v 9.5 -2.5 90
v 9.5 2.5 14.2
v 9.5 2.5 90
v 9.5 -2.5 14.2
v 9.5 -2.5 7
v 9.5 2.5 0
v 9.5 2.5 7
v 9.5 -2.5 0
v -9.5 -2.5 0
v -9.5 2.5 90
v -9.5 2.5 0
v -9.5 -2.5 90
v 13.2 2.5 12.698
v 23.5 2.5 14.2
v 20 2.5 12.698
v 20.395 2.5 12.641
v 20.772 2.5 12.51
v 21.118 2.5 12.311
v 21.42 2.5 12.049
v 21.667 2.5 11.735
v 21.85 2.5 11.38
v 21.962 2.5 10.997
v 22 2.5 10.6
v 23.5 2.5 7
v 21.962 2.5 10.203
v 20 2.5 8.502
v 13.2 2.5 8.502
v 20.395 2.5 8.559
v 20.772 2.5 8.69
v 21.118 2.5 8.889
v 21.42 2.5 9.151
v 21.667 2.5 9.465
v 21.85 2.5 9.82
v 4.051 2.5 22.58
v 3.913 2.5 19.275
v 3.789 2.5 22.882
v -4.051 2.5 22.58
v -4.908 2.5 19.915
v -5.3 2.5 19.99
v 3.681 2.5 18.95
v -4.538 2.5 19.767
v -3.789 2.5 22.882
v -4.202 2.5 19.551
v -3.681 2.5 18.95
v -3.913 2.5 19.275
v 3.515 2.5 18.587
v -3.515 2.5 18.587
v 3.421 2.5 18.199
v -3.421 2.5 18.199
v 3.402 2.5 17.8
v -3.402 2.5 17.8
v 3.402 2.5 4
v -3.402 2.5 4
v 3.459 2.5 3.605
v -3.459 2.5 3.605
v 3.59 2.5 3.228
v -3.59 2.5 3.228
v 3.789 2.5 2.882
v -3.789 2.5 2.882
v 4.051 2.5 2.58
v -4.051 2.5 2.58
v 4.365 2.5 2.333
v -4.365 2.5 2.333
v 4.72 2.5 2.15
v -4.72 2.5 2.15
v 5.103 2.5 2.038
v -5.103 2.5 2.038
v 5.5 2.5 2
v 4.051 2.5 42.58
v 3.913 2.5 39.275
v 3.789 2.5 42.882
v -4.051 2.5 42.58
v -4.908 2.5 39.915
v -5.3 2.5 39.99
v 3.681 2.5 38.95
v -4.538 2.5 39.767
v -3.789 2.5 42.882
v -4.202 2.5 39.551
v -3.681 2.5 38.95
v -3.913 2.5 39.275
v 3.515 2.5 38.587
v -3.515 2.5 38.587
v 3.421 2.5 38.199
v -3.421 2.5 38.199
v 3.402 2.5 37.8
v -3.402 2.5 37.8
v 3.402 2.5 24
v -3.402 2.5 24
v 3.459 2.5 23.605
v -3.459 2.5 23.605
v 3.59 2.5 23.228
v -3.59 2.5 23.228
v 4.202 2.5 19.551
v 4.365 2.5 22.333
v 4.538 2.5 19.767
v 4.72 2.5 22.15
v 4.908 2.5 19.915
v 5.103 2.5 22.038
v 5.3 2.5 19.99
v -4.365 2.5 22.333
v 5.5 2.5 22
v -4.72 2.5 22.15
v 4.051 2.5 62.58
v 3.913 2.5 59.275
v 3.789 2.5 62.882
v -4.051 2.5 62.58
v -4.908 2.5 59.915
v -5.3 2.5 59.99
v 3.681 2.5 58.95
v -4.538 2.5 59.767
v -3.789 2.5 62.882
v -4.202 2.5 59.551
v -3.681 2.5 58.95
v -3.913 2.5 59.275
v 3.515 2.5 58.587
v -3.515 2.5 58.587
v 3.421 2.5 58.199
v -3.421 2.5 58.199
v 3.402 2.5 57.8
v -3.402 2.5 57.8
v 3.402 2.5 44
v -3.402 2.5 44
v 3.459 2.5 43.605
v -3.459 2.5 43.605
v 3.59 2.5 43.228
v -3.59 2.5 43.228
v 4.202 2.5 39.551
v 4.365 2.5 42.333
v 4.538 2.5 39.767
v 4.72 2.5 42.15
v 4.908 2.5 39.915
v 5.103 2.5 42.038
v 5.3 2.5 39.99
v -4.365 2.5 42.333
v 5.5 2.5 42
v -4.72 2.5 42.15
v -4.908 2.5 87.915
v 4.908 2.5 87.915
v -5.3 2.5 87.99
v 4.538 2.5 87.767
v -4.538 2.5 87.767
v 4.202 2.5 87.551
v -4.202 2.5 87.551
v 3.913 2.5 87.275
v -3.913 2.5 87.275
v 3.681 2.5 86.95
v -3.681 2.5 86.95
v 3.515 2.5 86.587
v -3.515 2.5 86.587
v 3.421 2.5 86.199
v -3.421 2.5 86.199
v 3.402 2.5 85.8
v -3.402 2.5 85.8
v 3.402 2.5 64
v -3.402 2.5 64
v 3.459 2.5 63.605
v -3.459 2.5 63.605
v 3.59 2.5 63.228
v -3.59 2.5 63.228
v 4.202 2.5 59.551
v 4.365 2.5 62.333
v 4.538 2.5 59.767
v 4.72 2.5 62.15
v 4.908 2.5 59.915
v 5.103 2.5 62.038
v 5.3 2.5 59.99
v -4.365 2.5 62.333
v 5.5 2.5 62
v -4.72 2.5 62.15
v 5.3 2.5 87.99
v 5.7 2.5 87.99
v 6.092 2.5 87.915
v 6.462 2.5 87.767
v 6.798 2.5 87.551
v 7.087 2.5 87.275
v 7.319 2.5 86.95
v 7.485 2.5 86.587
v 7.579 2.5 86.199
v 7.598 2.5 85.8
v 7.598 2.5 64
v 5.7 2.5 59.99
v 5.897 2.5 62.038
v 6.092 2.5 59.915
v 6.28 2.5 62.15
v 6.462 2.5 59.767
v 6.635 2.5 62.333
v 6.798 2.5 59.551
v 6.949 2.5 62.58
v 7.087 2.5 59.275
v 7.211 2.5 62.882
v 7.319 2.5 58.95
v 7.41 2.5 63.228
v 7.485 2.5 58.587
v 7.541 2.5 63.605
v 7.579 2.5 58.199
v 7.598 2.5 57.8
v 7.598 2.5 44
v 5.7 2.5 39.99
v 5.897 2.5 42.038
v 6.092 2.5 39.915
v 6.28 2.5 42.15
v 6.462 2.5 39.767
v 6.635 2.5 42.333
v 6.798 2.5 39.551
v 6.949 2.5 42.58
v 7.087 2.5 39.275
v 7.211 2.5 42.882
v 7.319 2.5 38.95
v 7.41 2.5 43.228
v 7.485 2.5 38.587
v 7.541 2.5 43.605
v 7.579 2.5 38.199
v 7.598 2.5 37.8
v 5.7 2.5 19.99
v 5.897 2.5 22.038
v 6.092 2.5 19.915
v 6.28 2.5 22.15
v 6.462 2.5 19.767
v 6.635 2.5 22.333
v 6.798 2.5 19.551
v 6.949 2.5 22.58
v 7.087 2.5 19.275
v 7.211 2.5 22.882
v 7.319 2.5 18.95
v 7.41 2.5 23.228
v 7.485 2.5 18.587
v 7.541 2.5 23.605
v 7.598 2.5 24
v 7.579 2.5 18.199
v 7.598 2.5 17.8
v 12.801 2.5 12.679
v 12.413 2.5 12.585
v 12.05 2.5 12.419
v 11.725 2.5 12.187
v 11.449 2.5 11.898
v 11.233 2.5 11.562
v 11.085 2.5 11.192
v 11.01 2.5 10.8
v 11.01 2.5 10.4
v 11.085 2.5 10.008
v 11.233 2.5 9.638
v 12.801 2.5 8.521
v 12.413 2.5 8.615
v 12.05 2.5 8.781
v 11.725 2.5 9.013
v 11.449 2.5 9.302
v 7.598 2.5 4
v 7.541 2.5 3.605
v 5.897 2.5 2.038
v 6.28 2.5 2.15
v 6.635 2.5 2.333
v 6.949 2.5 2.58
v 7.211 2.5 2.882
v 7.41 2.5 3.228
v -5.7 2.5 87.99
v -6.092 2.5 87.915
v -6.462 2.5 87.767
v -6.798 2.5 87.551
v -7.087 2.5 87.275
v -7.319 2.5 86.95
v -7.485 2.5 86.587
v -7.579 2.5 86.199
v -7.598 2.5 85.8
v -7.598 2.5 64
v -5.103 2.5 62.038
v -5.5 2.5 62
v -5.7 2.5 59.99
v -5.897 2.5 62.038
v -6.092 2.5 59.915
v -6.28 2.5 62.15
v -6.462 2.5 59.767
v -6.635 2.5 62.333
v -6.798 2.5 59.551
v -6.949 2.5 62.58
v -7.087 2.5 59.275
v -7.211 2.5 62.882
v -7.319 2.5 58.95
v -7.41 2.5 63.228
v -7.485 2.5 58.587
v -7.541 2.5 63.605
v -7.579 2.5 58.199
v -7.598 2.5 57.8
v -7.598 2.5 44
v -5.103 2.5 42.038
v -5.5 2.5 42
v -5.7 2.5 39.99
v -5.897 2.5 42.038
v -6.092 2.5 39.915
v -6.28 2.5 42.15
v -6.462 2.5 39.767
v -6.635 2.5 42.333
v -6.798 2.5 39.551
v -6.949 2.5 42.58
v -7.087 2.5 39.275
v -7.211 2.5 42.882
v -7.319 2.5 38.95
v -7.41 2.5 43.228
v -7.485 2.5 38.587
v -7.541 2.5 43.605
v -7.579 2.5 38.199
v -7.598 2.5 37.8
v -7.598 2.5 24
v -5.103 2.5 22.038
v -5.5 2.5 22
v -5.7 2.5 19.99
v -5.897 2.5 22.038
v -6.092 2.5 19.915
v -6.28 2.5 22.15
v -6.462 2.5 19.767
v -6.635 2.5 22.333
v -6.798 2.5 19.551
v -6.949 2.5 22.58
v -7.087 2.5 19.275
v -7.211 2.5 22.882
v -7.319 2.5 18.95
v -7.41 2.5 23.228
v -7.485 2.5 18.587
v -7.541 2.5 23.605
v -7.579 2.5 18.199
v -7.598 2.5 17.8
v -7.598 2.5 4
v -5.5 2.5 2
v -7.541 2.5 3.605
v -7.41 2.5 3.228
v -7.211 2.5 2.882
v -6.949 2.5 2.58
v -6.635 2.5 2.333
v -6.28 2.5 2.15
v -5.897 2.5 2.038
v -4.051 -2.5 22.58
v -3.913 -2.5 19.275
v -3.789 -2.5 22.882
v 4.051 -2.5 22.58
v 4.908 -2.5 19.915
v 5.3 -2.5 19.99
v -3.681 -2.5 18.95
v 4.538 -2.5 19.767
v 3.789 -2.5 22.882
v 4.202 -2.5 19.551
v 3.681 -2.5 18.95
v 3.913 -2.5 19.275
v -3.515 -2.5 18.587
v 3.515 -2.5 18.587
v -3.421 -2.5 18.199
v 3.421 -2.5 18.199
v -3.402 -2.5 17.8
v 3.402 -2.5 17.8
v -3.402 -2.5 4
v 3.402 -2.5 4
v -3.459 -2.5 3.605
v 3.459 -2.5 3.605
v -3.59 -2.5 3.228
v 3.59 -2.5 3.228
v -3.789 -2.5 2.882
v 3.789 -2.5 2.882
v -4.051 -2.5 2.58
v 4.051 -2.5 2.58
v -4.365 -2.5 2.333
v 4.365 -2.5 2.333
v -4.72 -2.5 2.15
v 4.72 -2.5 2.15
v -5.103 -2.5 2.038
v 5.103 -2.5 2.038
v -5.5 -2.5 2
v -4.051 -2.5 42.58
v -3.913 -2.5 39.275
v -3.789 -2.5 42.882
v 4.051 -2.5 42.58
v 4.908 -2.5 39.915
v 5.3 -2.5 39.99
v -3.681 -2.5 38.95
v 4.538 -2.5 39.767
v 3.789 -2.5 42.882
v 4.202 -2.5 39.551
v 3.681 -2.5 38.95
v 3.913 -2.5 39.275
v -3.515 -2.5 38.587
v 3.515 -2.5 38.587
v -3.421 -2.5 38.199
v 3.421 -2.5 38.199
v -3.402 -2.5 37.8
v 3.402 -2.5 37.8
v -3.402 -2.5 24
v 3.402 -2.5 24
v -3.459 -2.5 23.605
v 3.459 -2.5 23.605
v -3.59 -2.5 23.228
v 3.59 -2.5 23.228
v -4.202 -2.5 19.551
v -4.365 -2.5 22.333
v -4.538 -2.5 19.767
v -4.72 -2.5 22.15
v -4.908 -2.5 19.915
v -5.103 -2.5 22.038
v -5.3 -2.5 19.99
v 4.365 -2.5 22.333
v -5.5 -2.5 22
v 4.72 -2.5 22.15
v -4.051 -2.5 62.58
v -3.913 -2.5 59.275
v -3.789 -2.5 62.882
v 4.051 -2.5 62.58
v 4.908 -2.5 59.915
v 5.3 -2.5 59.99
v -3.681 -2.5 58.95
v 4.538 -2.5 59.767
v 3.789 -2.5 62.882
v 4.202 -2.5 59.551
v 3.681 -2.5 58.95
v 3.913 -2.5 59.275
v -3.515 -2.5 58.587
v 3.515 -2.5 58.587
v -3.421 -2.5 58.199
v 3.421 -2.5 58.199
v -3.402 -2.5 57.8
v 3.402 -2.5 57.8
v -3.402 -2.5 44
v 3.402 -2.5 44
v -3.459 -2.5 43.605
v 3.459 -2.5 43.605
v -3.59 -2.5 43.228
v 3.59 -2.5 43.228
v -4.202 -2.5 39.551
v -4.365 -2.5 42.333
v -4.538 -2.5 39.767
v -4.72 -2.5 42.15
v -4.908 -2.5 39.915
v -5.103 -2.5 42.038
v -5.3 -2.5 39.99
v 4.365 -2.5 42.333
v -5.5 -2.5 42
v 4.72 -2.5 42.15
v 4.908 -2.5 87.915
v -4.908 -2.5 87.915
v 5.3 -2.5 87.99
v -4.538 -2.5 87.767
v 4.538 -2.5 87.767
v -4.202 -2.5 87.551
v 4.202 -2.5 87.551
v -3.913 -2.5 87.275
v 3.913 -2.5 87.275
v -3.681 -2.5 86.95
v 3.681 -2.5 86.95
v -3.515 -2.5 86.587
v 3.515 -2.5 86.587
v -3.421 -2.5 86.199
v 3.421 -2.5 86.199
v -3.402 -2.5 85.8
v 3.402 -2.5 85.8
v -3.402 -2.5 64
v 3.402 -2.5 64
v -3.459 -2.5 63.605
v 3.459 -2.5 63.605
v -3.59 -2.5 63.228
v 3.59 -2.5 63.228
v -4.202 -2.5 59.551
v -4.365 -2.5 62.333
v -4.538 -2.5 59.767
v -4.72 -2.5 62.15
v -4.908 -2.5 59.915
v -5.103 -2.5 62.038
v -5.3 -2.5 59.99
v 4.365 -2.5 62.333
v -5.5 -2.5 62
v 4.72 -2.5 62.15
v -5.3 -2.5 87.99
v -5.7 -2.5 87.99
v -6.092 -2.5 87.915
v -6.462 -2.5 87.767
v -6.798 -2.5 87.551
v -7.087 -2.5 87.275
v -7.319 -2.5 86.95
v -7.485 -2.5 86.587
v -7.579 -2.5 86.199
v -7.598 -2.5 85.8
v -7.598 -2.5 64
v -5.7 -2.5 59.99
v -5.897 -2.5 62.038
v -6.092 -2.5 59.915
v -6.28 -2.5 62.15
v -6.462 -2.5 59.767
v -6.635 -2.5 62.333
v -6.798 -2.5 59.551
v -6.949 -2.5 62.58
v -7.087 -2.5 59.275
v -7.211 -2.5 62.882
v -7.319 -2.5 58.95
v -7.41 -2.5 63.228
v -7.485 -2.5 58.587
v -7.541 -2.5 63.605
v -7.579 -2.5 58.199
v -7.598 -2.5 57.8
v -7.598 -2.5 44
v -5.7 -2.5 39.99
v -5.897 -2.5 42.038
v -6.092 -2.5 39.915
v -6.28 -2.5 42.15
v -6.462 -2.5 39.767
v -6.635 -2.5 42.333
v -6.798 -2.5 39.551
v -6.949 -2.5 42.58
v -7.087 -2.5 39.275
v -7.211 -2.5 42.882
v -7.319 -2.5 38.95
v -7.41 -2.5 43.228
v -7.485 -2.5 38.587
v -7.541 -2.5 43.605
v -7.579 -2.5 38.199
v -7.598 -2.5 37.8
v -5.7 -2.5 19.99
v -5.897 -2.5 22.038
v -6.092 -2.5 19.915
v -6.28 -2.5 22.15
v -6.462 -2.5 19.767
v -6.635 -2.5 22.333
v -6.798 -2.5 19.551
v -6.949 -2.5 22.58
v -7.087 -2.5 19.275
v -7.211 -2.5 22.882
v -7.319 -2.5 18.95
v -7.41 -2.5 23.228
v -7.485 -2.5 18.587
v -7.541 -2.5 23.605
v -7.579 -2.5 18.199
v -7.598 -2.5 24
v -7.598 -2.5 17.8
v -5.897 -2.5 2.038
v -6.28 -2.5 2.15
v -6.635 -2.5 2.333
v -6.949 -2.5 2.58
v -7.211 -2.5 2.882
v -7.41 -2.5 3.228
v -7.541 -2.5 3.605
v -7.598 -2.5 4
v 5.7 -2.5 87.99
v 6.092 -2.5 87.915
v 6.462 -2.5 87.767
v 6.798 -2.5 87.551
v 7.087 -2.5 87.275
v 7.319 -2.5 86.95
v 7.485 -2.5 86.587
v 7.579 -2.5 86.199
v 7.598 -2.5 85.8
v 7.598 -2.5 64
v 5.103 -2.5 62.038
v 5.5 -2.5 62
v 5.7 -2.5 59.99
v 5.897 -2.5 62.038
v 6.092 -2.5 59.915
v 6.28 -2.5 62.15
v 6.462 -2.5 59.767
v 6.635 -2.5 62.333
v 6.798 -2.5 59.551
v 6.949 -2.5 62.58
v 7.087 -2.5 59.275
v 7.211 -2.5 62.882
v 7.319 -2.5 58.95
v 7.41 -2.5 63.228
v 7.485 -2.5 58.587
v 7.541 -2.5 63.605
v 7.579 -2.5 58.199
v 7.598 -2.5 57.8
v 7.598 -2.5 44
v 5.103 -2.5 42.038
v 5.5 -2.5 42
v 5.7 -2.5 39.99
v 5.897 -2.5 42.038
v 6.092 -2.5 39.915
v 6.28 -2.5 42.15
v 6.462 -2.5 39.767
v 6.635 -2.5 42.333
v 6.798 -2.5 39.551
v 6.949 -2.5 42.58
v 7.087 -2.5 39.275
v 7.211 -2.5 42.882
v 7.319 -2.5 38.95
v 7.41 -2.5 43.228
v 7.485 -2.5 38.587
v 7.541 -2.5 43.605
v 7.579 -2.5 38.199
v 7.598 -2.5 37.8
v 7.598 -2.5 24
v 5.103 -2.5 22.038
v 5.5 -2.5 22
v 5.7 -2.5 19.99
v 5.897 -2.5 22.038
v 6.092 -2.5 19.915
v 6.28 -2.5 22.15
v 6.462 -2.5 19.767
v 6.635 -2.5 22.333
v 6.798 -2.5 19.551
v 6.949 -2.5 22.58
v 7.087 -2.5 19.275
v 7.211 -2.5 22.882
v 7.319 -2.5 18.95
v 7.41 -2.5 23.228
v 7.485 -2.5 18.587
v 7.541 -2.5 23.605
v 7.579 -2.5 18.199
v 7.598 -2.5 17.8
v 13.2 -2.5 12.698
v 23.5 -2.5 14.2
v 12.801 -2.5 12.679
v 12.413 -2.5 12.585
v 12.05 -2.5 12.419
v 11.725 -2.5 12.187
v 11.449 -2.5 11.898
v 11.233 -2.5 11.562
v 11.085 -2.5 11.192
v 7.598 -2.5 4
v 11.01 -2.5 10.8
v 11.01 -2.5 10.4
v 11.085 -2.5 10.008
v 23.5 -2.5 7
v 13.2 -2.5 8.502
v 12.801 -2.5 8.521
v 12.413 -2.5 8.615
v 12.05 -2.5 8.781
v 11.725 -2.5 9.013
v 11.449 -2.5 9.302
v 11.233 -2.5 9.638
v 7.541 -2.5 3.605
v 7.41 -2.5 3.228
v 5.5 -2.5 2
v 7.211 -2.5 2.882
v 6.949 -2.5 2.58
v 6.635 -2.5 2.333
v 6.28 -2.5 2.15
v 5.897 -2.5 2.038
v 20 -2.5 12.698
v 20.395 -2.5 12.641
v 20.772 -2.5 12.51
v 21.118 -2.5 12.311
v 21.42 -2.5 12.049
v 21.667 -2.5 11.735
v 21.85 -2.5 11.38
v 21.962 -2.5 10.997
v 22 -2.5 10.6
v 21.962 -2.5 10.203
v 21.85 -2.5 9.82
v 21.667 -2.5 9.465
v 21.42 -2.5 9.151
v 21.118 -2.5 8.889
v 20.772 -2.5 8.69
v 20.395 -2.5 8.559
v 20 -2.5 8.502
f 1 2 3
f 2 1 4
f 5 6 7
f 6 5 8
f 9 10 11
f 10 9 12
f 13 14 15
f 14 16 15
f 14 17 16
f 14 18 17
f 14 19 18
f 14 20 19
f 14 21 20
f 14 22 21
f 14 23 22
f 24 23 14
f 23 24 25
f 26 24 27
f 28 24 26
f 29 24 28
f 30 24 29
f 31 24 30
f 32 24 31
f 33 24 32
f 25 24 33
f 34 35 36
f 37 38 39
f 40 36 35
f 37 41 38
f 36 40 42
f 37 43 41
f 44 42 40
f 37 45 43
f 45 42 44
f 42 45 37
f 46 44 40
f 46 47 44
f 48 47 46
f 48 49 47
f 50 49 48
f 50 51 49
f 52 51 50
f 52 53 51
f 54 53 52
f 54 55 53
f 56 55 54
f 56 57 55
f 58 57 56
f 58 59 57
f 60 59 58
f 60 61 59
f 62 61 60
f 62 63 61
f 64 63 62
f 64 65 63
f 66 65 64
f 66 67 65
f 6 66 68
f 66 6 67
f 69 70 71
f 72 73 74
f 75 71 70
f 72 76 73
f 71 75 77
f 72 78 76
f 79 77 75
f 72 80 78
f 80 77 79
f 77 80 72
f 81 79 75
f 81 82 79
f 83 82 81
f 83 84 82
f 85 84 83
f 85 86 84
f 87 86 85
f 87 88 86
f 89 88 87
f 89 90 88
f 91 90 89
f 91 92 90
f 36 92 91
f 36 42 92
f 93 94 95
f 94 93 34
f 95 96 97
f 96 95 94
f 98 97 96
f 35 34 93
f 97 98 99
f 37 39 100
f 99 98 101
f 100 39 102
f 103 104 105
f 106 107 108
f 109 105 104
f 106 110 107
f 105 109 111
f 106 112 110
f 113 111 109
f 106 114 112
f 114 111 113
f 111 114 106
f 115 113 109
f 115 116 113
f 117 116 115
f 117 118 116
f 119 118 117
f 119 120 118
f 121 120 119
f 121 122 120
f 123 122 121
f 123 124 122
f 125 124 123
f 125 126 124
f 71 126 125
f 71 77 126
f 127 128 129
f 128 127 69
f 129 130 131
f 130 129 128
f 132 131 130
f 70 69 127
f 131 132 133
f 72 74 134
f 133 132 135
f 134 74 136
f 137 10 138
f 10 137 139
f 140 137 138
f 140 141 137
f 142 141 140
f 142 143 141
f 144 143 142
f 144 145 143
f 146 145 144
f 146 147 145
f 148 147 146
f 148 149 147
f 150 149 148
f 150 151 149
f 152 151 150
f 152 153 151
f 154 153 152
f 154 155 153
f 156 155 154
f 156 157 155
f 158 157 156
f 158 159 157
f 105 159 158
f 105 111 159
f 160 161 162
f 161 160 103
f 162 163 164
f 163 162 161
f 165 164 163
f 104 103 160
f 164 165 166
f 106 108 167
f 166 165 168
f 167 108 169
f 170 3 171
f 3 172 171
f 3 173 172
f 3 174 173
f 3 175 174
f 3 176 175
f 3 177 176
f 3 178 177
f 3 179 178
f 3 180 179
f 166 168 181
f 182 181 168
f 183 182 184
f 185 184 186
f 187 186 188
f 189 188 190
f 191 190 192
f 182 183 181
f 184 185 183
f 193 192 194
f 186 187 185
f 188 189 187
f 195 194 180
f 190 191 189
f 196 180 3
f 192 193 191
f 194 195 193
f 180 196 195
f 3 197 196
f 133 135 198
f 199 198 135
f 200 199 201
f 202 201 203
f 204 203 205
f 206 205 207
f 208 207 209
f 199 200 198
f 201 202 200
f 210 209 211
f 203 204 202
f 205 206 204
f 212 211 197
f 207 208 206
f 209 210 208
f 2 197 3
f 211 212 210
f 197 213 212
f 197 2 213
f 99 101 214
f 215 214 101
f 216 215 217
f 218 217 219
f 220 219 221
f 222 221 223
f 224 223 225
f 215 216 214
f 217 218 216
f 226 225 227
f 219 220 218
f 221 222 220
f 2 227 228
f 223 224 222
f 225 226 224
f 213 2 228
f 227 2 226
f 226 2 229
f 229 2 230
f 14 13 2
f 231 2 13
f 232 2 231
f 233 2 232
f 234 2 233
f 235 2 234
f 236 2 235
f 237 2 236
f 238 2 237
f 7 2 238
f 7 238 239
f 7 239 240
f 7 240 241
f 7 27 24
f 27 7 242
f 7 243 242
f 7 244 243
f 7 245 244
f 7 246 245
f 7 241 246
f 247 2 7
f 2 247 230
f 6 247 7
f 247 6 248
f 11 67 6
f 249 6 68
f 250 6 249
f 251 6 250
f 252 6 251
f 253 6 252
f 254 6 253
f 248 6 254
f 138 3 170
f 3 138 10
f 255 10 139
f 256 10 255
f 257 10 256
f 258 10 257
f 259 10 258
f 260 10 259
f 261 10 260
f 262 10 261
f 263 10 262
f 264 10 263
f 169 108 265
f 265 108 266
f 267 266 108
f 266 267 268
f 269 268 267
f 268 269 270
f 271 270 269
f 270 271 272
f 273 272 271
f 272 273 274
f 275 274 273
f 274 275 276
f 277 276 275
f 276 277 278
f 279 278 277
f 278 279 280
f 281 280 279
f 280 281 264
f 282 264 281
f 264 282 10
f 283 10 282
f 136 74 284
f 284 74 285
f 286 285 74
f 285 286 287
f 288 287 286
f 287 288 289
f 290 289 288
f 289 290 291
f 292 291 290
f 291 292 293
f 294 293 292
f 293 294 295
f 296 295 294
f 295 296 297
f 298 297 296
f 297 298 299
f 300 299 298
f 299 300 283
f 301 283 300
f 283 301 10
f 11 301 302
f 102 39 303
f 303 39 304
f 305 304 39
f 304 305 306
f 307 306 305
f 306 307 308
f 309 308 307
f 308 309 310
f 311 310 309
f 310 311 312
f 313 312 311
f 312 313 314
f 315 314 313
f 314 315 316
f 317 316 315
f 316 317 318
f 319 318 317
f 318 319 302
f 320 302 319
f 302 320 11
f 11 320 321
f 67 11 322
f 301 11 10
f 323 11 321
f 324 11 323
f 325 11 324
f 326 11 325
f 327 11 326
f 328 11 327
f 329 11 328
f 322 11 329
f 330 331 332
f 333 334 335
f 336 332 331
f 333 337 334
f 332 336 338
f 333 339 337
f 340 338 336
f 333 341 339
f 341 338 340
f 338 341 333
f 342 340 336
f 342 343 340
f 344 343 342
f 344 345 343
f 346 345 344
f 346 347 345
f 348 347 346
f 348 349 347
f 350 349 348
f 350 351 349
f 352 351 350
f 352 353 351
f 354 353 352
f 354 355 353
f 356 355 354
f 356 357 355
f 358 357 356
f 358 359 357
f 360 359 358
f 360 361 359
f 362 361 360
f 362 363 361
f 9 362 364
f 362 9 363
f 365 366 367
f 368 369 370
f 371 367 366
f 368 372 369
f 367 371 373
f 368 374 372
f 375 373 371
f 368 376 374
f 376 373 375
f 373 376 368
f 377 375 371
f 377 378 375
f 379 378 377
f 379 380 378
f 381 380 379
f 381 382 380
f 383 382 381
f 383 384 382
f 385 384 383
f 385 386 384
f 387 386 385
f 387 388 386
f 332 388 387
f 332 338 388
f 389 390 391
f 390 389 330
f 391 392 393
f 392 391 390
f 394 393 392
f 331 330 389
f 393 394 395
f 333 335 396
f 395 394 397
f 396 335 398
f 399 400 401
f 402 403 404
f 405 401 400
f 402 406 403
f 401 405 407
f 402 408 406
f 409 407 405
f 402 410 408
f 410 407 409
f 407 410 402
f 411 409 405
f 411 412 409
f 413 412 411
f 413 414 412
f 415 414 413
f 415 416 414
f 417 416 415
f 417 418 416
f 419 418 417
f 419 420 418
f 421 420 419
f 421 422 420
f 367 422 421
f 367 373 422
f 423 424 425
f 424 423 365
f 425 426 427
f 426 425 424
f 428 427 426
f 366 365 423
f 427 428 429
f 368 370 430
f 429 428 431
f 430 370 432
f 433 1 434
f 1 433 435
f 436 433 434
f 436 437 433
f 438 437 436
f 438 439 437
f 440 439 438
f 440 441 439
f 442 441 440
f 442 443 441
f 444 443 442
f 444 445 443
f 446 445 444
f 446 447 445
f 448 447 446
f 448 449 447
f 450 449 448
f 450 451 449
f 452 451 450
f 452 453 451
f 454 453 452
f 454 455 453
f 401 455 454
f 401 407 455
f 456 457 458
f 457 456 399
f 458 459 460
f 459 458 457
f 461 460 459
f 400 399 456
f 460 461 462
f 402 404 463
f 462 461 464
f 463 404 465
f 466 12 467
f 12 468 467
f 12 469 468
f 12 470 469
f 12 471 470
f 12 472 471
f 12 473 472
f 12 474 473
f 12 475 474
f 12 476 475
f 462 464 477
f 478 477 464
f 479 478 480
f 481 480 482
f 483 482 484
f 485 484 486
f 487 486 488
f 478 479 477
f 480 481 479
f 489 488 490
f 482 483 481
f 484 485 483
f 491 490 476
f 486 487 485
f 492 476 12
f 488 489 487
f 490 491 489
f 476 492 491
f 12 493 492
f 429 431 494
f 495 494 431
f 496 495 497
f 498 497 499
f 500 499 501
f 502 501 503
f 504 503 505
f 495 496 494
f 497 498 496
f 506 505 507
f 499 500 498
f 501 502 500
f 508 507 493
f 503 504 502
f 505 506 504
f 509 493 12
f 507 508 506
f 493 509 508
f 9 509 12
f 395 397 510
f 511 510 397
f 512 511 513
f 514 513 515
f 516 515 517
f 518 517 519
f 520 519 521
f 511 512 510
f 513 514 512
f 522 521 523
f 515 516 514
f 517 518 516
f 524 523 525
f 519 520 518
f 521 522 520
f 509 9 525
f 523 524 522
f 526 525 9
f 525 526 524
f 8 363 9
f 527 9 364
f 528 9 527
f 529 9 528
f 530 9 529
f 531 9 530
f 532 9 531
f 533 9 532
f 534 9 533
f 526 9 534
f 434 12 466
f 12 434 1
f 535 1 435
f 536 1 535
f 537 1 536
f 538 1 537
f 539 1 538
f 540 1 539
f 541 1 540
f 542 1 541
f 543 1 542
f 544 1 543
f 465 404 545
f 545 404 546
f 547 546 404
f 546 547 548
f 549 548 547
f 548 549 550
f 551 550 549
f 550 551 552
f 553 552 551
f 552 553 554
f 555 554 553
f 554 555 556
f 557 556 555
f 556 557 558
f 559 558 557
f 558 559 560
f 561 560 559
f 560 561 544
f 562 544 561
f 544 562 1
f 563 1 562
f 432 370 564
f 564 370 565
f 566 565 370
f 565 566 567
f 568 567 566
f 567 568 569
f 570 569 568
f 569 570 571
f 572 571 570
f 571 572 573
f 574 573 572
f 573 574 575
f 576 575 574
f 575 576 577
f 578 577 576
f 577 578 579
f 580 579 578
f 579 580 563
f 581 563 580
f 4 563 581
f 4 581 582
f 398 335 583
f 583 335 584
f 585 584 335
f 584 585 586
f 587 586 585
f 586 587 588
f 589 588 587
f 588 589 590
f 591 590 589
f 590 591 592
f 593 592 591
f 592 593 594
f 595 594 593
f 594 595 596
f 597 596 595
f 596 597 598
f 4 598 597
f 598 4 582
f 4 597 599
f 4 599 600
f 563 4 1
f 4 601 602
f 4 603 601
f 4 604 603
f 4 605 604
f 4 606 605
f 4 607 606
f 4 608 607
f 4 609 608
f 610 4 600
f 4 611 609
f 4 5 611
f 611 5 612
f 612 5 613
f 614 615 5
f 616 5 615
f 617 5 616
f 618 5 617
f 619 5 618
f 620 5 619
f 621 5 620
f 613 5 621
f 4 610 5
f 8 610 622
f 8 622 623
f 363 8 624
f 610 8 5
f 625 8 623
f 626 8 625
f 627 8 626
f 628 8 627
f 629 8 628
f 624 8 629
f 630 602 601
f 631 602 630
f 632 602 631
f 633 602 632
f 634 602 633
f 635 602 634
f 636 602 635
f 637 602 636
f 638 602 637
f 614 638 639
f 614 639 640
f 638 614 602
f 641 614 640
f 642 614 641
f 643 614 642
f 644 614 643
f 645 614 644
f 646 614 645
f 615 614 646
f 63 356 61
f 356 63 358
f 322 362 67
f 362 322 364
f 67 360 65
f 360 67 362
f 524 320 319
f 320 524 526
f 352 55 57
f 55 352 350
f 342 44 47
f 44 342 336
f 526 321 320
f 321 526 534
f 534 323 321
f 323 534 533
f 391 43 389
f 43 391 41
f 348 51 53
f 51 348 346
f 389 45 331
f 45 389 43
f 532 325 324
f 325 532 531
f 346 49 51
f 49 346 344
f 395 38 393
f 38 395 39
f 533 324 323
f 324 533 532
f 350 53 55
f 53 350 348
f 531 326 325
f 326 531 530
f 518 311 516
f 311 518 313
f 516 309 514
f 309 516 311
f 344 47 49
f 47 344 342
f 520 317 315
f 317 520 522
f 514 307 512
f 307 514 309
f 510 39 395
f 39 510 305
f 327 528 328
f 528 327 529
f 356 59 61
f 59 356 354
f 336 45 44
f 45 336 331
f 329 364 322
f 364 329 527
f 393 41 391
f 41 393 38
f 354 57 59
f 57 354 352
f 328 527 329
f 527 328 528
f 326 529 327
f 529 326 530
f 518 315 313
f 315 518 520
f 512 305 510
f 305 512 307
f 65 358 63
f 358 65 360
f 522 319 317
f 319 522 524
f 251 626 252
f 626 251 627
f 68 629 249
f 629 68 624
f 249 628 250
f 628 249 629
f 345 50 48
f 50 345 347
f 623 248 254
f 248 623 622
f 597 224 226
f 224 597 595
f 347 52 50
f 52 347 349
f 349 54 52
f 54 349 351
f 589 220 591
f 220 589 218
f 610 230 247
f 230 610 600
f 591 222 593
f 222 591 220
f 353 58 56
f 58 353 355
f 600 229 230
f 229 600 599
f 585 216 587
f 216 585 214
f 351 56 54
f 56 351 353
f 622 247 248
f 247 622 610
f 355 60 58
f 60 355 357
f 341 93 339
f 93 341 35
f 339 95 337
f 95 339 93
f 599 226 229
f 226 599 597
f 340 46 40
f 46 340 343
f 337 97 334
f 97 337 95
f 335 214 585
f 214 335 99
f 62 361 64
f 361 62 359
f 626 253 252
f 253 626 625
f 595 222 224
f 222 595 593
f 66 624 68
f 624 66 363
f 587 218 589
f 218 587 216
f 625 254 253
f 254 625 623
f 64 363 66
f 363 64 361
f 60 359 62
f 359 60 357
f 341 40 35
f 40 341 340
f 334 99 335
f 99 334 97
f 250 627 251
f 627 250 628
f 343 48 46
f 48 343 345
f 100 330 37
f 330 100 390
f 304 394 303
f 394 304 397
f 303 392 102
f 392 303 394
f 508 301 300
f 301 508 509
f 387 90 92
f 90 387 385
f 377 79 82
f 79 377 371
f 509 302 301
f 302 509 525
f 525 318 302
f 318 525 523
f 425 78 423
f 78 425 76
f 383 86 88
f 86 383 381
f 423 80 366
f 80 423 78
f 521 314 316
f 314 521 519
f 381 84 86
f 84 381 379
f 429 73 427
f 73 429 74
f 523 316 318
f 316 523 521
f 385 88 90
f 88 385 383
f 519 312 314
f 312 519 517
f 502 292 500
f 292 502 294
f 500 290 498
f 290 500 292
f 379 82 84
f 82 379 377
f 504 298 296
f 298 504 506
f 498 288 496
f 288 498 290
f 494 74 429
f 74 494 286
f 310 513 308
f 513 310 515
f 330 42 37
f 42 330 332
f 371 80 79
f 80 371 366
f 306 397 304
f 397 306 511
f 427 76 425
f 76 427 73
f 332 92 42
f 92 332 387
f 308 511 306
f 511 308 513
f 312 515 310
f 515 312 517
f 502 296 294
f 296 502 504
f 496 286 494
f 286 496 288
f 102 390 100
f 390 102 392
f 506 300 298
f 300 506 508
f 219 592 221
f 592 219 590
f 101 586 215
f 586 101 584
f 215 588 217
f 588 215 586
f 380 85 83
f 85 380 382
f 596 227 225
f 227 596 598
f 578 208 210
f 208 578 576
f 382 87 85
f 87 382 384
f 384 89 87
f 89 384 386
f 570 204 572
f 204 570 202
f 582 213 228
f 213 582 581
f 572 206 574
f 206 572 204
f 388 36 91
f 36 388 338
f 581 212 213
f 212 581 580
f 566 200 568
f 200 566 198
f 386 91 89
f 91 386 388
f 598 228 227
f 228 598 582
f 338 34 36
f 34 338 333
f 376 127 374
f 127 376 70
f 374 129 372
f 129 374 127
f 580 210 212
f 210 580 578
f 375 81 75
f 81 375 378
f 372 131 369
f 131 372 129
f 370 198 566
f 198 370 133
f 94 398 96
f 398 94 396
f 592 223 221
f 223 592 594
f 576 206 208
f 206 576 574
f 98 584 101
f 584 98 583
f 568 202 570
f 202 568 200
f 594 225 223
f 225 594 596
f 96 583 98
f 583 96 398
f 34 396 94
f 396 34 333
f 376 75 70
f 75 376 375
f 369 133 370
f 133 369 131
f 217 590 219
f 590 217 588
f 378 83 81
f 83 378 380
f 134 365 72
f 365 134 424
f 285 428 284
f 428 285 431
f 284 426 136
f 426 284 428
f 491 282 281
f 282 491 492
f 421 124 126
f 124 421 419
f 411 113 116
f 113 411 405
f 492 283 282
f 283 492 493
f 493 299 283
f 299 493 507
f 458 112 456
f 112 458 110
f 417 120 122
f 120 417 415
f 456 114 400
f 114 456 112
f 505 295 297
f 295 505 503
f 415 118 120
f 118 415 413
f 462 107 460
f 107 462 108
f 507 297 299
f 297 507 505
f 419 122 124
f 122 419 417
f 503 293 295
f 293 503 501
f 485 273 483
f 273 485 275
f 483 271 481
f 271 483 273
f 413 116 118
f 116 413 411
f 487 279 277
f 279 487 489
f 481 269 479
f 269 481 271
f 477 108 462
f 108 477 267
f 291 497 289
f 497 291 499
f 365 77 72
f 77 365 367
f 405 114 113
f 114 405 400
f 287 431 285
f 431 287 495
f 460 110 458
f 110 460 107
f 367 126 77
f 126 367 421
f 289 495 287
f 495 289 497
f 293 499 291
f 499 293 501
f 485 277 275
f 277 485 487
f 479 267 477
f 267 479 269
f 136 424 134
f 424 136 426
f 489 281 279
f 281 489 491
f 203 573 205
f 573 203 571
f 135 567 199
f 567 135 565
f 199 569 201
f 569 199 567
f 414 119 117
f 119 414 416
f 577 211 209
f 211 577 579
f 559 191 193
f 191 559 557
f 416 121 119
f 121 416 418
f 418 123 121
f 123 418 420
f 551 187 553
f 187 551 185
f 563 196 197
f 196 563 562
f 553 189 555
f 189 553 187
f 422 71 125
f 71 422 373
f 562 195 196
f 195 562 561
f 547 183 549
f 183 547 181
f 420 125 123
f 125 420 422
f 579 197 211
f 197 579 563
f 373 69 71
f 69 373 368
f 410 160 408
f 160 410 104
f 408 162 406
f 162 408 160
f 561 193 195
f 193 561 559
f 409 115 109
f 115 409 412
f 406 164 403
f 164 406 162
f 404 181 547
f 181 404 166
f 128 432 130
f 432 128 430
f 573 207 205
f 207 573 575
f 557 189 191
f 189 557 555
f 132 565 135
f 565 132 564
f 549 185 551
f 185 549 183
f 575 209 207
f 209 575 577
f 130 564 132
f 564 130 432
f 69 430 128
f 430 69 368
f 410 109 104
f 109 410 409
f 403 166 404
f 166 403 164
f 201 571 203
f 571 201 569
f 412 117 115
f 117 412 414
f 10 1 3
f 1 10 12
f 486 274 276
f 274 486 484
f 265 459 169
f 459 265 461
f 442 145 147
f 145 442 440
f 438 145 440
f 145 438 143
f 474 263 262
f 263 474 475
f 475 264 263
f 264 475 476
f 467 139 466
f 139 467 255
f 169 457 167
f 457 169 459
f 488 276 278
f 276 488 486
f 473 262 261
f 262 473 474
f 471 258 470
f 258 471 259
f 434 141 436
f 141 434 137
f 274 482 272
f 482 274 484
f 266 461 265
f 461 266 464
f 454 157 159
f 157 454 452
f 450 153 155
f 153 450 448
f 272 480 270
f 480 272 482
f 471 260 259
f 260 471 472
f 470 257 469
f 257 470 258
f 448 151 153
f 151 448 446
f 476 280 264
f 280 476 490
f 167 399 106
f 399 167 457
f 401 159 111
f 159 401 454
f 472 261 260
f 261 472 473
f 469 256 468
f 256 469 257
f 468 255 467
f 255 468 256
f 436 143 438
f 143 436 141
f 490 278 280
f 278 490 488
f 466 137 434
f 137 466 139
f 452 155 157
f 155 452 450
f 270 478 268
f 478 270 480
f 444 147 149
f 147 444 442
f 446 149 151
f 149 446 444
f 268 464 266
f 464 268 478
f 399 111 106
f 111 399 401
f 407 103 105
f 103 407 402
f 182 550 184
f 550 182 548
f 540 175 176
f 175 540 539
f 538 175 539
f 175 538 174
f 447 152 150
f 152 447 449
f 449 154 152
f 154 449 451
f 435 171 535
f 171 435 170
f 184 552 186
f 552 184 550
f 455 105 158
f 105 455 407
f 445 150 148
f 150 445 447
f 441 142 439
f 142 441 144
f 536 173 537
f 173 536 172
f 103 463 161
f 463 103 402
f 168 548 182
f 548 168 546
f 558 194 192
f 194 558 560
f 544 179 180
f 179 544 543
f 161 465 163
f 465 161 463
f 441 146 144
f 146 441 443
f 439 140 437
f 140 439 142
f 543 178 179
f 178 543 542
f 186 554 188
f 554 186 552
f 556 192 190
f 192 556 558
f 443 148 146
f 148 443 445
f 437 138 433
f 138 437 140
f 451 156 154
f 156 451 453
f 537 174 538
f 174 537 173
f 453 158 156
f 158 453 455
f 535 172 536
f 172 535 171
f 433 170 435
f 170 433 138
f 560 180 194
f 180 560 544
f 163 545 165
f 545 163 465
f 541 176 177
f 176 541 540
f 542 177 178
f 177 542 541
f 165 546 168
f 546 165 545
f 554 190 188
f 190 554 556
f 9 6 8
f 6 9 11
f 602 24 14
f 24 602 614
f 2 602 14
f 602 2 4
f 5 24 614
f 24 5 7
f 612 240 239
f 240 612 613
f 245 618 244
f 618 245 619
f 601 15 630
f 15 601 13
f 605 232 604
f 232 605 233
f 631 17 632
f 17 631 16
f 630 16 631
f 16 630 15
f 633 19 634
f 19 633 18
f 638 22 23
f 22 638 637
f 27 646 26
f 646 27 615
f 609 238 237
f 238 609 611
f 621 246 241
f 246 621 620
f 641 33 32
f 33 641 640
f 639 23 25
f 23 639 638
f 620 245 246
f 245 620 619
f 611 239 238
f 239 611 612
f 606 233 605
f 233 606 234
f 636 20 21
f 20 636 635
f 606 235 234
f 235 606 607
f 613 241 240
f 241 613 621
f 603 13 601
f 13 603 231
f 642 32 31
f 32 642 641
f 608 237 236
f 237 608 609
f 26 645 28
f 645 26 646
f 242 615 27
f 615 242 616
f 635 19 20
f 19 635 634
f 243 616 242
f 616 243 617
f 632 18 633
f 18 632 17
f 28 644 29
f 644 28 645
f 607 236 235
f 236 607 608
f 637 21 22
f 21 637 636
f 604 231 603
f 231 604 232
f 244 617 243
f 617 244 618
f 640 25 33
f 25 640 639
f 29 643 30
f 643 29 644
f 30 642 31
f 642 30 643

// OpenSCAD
/* Begin suggested config */
total_height = 70; // total screw travel. Outer actual will be a little bigger.
depth = 5; // want to be kinda thick so it doesn't move

// If false, remainder is a small segment on top
// If true, top segment is stretched to fill space.
remainder_fill = true; 

screw_distance = 11;
screw_hole_d = 4.2;

track_length = 18;
track_spacing = 2;
frame_width = 19; // 2020 frame is 20mm wide

offshoot=true;
offshoot_track=11;
offshoot_padding = 3;
offshoot_z_offset = track_length/2 - track_spacing;
offshoot_x_offset = 0;

/* end config */


$fa = 1;
$fs = 0.4;
fudge = 0.001;


panel_segment_height = (track_length + track_spacing);
// -track_spacing because we always put a block of 1 track_spacing at the bottom
normal_panel_count = floor((total_height - track_spacing) / panel_segment_height);
// panel_remainder does not have track_spacing included.
panel_remainder = (total_height - track_spacing) - (normal_panel_count * panel_segment_height) - track_spacing;
min_panel_height = (track_spacing + screw_hole_d) + 0.1;
echo("normal_panel_count", normal_panel_count);
echo("remainder", panel_remainder);
echo("min_panel_height", min_panel_height);

// If there's not enough space for an independent remainder section, we forcefully fill it.
do_remainder_fill = (panel_remainder > min_panel_height) ? remainder_fill : true;
if (do_remainder_fill != remainder_fill) {
    echo("WARNING: Not enough space, forcing remainder_fill = true");
}

/* BEGIN */


union(){
    
    
    
        all_panels();
    
    if (offshoot) {
        #translate([
            ((frame_width/2)+((offshoot_track + offshoot_padding)/2)) + offshoot_x_offset,
            0,
            ((screw_hole_d + offshoot_padding)/2) + offshoot_z_offset
        ]){
            difference() {
                cube([offshoot_track + offshoot_padding, depth, screw_hole_d + offshoot_padding], center=true);
                hull()
                    screw_holes(offshoot_track - screw_hole_d, screw_hole_d, depth, vertical=false);
            }
        }
    }
    
}

module all_panels() {
    // Align btm of all_panels to Z=0
    translate([0, 0, (panel_segment_height/2) + track_spacing])
    union() {
        for(i = [0 : (normal_panel_count - (do_remainder_fill ? 1 : 0))]) {
            translate([0, 0, (panel_segment_height*i)])
                panel();
        }
        if (do_remainder_fill) {
            btm_align = panel_remainder/2 + track_spacing/2;
            remainder_offset = btm_align + (panel_segment_height*normal_panel_count);
            // need to include track_spacing because there would be an extra spacer here
            translate([0, 0, remainder_offset])
                panel(panel_segment_height + panel_remainder);
        }
        else {
            btm_align = -((panel_segment_height/2)-(panel_remainder/2 + track_spacing/2));
            remainder_offset = btm_align + (panel_segment_height*(normal_panel_count+1));
            translate([0, 0, remainder_offset])
                panel(panel_remainder);
        }
        // little extra piece at the bottom
        translate([0, 0, (panel_segment_height/-2) + (track_spacing/-2)])
            cube([frame_width, depth, track_spacing], center=true);
    }
    
}

module panel(want_track_length = track_length) {
    
    new_track_len = want_track_length - screw_hole_d;
    // new_height should be == panel_segment_height with defaults
    new_height = want_track_length + track_spacing;
    mv_down = track_spacing/-2;
    
    difference() {
        cube([frame_width, depth, new_height], center=true);
        
        translate([screw_distance/-2, 0, mv_down])
            hull()
            screw_holes(new_track_len, screw_hole_d, depth, vertical=true);
        translate([screw_distance/2, 0, mv_down])
            hull()
            screw_holes(new_track_len, screw_hole_d, depth, vertical=true);
        
    }
}

module screw_holes(distance, diameter, wall, vertical=true) {
    //translate([0, 0, (switch_height/2) - (switch_screw_hole_d/2) - (wall/2)])
    rotate(vertical ? 90 : 0, [0, 1, 0])
    for (s = [-2:4:2]) {
        translate([distance/s, 0, 0])
        rotate([90, 0, 0])
        cylinder(wall*4, d=diameter, center=true);
    }
}

/*

wall = 3;


frame_screw_distance = 11;
frame_screw_hole_d = 4.2;
frame_width = max(17, frame_screw_hole_d + wall); // 2020 frame is 20mm wide
frame_height = frame_screw_distance + frame_screw_hole_d + wall;

switch_screw_distance = 11;
switch_screw_hole_d = 4;
switch_width = max(17, switch_screw_distance + switch_screw_hole_d + wall);
switch_height = 67; // total outside, screw guides will be smaller
switch_extra_width = wall*2; // for support
switch_screw_offset_bottom = wall;

switch_screw_guide_length = switch_height - wall - switch_screw_hole_d - switch_screw_offset_bottom;


union() {
    // frame
    translate([switch_width/2 + frame_width/2, 0, 0])
    difference() {
        cube([frame_width, wall, frame_height], center=true);
        
        screw_holes(frame_screw_distance, frame_screw_hole_d, vertical=true);
    }


    // vert
    translate([0, 0, switch_height/2 - frame_height/2])    
    difference() {
        cube([switch_width + switch_extra_width, wall, switch_height], center=true);
        
        for (v = [-1:2:1]) {
            translate([(switch_screw_distance / 2) * v, 0, switch_screw_offset_bottom/2])
            hull()
            screw_holes(switch_screw_guide_length, switch_screw_hole_d, vertical=true);
        }
    }
    
}

module screw_holes(distance, diameter, vertical=true) {
    //translate([0, 0, (switch_height/2) - (switch_screw_hole_d/2) - (wall/2)])
    rotate(vertical ? 90 : 0, [0, 1, 0])
    for (s = [-2:4:2]) {
        translate([distance/s, 0, 0])
        rotate([90, 0, 0])
        cylinder(wall*4, d=diameter, center=true);
    }
}
*/
